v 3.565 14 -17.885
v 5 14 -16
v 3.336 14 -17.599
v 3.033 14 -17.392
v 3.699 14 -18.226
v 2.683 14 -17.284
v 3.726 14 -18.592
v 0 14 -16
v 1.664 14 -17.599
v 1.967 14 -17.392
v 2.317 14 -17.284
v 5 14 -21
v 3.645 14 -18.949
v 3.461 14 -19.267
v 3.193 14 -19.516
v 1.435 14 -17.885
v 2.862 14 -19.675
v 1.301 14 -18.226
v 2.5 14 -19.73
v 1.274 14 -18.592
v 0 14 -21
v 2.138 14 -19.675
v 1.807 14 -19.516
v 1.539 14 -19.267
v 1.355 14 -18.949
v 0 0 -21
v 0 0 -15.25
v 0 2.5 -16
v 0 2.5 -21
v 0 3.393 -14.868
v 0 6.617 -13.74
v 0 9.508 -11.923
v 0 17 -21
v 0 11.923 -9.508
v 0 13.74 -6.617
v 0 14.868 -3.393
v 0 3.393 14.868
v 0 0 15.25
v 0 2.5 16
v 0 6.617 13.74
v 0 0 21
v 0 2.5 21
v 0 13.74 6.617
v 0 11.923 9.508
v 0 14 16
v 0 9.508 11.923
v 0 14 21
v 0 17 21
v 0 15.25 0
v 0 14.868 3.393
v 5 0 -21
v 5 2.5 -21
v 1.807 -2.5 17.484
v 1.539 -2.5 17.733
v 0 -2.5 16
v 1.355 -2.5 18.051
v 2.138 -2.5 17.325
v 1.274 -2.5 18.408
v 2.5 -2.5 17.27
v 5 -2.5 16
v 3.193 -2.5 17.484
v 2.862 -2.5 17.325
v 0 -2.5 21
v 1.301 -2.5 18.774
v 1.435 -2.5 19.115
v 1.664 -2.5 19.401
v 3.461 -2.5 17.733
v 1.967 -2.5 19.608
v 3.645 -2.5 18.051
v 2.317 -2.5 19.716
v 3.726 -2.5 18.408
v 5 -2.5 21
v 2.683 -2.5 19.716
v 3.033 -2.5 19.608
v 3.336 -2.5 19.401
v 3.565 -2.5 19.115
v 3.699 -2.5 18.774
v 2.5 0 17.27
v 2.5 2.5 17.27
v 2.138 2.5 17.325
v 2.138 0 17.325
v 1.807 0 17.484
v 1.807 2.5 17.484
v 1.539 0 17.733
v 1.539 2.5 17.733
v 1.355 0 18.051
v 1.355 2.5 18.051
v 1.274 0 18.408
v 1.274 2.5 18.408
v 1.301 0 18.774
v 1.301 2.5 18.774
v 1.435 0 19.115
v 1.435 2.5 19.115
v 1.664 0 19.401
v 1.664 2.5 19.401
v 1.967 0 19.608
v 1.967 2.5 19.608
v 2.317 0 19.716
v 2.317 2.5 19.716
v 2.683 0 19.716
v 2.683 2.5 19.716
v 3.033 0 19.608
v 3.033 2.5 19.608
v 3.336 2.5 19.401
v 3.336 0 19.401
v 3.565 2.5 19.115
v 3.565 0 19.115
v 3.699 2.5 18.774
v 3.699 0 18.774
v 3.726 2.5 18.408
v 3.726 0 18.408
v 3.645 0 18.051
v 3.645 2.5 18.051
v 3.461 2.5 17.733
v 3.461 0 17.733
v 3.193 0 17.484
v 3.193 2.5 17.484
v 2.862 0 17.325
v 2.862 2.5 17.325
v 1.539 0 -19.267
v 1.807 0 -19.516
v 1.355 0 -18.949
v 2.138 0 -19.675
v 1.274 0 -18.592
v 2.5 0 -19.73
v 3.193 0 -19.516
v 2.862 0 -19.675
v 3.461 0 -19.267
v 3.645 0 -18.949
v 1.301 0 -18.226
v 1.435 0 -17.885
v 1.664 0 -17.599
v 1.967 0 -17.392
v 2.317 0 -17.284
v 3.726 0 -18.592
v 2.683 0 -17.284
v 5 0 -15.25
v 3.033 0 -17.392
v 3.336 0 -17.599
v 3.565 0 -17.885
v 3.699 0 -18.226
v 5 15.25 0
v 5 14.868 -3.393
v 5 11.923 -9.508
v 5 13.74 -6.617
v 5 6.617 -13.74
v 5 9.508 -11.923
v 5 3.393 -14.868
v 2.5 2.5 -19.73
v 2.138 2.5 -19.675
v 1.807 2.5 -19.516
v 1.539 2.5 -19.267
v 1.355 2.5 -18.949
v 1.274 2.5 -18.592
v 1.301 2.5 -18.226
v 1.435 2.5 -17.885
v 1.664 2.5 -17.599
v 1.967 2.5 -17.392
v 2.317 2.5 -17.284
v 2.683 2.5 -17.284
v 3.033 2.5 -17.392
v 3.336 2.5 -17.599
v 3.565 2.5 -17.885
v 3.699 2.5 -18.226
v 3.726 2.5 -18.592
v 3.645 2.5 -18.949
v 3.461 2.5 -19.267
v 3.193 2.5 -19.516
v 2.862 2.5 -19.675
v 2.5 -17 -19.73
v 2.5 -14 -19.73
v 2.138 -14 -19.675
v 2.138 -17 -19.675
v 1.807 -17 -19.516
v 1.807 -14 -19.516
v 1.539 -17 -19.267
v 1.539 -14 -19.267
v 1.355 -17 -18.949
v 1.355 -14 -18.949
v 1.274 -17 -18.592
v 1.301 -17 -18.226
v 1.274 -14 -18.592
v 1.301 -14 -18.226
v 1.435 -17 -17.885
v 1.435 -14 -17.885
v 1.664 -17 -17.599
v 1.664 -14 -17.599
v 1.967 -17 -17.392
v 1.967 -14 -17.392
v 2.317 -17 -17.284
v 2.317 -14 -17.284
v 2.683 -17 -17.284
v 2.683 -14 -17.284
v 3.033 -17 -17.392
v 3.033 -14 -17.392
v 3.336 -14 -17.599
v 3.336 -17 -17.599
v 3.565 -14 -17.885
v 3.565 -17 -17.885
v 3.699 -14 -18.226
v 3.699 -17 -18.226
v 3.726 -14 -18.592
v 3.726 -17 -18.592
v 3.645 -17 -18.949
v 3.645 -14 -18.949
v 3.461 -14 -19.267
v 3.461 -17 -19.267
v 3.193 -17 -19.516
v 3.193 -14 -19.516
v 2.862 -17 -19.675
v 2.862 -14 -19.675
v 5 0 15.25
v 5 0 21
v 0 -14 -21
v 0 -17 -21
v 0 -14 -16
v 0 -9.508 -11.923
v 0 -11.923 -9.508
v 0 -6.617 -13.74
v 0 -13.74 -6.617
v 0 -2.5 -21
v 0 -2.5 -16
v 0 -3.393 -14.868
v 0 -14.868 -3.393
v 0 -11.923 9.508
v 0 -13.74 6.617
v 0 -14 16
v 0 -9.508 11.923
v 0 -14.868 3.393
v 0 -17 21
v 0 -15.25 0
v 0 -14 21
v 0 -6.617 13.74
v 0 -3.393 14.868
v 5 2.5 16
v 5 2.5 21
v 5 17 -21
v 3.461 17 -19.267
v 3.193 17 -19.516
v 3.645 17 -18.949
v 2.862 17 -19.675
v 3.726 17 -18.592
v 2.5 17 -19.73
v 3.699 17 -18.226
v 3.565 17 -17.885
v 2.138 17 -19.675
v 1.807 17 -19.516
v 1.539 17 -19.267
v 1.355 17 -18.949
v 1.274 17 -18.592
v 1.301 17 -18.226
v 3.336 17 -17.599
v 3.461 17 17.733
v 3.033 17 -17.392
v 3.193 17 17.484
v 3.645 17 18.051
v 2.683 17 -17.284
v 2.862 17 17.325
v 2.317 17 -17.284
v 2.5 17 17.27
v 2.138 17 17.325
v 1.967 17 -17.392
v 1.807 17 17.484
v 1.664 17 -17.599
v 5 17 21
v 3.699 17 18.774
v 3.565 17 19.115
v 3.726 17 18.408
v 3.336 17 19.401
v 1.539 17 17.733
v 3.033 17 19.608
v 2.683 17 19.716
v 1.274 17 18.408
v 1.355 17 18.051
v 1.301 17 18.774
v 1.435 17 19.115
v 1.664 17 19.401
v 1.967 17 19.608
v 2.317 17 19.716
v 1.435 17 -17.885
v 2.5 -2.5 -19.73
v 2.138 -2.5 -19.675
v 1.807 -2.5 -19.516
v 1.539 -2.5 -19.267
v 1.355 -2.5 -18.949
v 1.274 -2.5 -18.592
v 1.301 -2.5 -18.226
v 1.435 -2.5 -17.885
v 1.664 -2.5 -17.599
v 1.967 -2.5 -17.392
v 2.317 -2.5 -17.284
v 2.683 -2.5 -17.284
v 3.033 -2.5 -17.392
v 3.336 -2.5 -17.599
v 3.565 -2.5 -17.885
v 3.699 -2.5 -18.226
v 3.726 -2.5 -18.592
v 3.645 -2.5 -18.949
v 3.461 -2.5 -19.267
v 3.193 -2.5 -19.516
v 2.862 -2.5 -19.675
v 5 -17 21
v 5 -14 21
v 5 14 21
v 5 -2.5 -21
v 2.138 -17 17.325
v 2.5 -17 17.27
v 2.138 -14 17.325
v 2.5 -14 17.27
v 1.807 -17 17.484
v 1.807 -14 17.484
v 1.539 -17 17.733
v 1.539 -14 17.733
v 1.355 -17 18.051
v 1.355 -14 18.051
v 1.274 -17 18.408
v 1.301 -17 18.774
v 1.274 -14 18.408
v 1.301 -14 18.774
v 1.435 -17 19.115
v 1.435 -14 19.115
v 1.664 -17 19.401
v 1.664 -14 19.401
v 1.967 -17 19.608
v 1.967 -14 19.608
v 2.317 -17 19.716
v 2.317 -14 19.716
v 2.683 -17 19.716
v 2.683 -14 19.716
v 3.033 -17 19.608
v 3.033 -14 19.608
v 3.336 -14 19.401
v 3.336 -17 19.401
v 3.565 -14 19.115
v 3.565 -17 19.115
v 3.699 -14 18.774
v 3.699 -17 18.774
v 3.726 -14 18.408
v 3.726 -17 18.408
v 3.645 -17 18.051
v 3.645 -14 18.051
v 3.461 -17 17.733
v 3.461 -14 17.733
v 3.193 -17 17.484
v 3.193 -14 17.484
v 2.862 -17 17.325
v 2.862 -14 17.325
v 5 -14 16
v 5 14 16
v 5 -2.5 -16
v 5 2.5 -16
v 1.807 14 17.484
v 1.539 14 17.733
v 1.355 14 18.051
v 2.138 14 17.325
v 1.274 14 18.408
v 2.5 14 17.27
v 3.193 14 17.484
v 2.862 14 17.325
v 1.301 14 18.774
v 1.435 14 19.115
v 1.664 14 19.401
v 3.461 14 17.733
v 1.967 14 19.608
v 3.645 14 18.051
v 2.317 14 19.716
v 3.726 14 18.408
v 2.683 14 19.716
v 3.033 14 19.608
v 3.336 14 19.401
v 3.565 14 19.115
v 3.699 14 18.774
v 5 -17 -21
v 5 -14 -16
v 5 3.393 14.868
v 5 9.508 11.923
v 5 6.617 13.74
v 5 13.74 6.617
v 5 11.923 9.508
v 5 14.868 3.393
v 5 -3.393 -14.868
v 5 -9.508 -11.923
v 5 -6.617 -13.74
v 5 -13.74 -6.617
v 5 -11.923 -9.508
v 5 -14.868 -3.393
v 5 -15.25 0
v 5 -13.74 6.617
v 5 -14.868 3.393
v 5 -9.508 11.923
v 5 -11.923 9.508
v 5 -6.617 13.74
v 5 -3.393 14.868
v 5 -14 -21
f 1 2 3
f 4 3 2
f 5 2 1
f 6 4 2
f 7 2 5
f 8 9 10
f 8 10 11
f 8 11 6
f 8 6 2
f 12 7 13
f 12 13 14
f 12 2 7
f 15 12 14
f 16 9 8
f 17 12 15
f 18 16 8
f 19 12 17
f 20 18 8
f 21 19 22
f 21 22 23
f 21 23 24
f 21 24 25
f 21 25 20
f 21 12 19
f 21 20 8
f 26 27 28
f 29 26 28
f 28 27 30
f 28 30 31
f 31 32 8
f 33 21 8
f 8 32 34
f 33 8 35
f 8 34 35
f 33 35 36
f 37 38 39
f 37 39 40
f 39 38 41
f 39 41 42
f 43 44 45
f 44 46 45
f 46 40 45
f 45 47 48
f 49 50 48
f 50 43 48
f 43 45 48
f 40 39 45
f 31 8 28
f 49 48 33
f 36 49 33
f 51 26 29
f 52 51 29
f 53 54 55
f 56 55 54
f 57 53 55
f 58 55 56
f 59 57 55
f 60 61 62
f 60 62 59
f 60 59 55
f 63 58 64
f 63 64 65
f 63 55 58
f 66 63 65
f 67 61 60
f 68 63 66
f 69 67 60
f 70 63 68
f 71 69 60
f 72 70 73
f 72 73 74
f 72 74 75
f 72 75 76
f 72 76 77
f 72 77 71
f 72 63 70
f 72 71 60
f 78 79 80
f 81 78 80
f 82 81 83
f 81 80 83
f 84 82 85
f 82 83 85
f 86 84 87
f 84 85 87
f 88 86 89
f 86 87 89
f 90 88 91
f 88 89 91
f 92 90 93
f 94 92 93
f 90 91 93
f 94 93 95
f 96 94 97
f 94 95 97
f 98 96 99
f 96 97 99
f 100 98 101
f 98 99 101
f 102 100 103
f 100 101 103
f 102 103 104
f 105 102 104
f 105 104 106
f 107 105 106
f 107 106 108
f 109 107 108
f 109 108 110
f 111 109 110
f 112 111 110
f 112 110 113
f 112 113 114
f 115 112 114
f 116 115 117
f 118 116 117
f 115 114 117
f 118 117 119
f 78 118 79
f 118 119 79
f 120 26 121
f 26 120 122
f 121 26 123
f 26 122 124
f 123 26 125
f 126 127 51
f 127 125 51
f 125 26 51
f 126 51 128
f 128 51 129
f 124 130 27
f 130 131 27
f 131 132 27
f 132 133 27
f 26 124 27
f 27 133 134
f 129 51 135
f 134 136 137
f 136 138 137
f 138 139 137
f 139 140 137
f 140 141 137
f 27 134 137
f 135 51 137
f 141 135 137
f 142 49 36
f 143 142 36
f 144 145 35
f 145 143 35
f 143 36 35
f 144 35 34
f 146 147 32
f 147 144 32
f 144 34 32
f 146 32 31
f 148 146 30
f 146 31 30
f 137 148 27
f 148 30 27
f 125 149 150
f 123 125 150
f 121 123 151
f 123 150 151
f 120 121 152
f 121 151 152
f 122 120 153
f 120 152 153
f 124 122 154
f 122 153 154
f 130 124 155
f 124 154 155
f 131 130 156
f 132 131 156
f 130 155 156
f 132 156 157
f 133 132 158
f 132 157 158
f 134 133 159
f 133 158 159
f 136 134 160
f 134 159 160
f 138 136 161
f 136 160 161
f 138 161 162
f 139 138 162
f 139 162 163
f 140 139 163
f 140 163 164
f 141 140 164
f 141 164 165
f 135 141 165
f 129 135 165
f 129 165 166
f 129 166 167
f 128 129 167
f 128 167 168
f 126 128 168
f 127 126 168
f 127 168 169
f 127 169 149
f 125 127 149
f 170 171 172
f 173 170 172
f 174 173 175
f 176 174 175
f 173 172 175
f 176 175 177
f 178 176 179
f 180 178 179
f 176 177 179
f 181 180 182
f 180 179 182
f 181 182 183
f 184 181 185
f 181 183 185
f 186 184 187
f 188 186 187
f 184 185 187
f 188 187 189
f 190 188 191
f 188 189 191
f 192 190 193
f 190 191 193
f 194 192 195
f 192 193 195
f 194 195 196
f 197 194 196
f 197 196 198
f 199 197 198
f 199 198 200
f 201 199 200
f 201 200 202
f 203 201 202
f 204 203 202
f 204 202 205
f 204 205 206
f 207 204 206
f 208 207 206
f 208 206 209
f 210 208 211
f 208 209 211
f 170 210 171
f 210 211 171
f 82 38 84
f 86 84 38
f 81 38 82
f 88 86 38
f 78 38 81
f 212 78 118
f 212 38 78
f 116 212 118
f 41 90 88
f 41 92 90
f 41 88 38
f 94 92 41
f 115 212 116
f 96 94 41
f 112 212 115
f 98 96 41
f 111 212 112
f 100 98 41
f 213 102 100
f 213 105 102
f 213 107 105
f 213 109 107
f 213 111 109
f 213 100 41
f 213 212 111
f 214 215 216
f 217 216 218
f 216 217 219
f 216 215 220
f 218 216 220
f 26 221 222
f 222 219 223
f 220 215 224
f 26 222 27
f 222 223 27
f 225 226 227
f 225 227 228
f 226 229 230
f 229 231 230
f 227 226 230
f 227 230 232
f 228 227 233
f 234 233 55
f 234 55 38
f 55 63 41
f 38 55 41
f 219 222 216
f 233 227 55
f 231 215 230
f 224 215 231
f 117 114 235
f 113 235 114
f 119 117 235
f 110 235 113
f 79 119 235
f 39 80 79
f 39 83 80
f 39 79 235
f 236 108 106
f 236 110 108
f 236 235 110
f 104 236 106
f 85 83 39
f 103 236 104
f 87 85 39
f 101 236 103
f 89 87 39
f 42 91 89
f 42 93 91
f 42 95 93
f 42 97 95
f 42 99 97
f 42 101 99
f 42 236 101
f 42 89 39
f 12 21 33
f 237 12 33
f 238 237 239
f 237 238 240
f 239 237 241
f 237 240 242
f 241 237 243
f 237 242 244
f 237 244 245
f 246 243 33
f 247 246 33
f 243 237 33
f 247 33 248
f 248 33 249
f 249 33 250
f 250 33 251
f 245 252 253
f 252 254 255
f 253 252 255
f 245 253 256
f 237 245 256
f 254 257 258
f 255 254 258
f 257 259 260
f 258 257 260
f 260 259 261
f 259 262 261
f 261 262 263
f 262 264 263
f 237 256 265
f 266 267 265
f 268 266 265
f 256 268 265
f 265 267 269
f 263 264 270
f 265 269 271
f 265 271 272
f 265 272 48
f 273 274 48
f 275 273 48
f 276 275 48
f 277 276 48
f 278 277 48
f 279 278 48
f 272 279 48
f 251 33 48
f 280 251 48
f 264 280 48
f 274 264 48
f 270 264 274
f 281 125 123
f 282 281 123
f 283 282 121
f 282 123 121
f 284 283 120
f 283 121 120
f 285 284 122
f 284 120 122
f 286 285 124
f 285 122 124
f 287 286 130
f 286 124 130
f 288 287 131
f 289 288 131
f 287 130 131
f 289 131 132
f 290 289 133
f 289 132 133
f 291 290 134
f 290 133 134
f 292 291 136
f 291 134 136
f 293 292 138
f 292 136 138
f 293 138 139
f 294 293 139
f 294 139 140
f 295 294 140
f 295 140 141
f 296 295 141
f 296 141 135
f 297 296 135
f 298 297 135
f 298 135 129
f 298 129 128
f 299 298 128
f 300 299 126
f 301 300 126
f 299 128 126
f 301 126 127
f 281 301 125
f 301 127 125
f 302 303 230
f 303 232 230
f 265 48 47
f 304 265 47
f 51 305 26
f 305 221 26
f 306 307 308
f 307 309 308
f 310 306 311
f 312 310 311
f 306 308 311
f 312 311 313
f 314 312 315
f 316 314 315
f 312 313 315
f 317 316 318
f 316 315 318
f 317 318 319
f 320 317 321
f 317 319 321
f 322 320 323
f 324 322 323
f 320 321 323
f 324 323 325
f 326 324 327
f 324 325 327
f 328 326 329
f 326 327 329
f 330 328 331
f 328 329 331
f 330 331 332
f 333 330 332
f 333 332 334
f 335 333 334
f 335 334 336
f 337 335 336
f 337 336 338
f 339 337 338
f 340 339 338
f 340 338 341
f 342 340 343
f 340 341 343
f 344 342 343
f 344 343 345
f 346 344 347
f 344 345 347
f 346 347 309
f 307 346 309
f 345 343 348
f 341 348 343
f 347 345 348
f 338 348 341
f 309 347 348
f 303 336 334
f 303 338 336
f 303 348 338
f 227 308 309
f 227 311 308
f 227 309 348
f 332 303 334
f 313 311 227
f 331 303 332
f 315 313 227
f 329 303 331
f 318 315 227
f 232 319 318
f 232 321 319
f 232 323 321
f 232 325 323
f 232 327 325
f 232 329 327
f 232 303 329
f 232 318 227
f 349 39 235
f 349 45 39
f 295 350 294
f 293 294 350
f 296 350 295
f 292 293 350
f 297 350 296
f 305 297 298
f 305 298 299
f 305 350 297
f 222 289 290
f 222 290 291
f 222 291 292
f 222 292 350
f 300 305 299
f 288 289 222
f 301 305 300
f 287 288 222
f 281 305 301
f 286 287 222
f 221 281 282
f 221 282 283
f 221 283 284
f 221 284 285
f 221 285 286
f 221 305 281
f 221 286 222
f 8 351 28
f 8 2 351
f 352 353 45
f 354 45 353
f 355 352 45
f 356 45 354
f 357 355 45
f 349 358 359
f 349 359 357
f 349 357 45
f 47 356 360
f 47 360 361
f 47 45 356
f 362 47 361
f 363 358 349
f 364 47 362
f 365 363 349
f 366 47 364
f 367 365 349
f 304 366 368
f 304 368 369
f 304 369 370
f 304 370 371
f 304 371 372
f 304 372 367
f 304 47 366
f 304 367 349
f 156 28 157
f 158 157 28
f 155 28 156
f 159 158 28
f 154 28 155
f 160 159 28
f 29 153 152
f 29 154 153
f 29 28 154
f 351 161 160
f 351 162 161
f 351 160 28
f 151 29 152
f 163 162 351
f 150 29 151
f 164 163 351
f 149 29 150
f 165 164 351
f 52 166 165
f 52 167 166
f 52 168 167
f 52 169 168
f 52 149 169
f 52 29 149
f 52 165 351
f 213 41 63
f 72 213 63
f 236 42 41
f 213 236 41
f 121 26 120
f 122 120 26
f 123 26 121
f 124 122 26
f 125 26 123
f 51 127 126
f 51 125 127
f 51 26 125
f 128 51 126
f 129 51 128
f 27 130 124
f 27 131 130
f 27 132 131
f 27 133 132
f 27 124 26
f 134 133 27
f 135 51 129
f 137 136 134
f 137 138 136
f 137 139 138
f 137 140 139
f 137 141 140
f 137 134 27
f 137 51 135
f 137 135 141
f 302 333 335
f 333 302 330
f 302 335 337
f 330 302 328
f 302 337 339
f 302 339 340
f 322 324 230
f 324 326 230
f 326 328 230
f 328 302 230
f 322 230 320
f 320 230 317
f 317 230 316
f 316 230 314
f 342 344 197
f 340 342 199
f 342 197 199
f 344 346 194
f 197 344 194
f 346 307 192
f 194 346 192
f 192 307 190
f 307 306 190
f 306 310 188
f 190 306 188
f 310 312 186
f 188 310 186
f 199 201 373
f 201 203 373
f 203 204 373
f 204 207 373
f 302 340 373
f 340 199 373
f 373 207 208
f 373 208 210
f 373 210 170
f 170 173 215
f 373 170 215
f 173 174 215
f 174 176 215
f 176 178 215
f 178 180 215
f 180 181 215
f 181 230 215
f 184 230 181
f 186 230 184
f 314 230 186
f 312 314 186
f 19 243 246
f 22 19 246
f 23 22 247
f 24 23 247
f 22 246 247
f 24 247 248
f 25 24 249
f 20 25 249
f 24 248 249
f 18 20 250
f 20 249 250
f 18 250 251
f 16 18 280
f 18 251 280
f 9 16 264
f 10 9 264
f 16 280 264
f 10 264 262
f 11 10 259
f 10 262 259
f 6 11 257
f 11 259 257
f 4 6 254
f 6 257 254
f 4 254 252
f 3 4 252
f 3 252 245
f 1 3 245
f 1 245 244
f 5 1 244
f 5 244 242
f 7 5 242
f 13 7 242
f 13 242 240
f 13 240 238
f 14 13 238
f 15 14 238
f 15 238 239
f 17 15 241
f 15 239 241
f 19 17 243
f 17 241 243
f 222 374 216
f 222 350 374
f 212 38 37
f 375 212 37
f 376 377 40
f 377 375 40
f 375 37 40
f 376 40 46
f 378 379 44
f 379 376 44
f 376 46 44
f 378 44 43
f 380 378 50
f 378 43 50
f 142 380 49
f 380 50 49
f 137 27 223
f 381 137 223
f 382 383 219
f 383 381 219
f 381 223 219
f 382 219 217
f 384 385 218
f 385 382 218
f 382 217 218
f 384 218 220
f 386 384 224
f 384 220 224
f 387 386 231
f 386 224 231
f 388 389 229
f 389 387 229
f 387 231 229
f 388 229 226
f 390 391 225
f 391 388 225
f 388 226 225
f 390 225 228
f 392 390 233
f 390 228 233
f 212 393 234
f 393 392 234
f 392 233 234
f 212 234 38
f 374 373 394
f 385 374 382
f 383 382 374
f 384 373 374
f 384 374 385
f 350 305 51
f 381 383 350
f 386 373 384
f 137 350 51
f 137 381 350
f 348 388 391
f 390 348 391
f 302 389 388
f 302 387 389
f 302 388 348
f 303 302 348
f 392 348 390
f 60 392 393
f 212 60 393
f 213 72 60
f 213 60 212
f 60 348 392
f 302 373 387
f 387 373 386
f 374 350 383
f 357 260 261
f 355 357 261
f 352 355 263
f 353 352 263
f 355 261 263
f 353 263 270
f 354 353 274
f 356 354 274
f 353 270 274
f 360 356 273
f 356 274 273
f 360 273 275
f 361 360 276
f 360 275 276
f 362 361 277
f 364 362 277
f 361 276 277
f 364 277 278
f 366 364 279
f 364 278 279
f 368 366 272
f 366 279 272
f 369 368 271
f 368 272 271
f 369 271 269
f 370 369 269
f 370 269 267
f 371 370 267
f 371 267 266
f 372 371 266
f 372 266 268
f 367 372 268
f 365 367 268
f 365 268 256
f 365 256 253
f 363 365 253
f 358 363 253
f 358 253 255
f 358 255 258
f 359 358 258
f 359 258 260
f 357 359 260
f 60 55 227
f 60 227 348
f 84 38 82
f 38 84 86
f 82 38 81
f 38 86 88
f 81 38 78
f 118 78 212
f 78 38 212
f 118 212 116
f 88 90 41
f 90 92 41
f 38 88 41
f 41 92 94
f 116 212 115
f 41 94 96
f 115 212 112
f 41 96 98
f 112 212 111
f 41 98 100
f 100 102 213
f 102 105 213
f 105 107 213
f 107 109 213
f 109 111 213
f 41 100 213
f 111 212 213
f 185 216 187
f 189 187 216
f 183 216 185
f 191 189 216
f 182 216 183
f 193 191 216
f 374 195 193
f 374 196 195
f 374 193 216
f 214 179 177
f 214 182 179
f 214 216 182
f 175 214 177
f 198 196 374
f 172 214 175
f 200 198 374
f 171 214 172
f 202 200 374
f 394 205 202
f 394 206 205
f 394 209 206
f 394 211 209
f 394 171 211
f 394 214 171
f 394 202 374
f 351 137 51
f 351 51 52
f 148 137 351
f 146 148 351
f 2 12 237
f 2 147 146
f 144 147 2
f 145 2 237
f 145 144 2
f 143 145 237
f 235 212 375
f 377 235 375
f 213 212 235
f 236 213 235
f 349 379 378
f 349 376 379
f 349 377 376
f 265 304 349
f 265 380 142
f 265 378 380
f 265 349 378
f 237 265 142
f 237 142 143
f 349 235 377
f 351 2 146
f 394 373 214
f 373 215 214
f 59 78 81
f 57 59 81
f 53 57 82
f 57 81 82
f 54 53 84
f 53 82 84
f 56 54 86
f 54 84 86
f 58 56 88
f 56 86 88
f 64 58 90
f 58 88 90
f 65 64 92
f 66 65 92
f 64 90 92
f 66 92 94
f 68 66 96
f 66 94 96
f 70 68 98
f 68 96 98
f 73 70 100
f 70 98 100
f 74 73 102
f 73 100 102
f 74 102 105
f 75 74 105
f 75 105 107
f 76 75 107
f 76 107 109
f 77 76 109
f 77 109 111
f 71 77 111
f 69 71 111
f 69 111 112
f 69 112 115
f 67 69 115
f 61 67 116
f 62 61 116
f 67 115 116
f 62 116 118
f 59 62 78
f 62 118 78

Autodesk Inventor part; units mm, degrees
ref_plane "YZ Plane" through (0, 0, 0) normal (1, 0, 0) x (0, 1, 0)
ref_plane "XZ Plane" through (0, 0, 0) normal (0, 1, 0) x (-1, 0, 0)
ref_plane "XY Plane" through (0, 0, 0) normal (0, 0, 1) x (1, 0, 0)
sketch "Sketch1" plane through (0, 0, 0) normal (1, 0, 0) x (0, 1, 0)
  circle A0 centre (0, 0) radius 15.25
  line L0 (15.25, 15.25) -> (-15.25, 15.25)
  line L1 (-15.25, 15.25) -> (-15.25, -15.25) construction
  line L2 (-15.25, -15.25) -> (15.25, -15.25)
  line L3 (15.25, -15.25) -> (15.25, 15.25) construction
  line L4 (15.25, 15.25) -> (-15.25, -15.25) construction
  line L5 (-15.25, 15.25) -> (15.25, -15.25) construction
  line L6 (17, 21) -> (-17, 21)
  line L7 (-17, 21) -> (-17, -21)
  line L8 (-17, -21) -> (17, -21)
  line L9 (17, -21) -> (17, 21)
  line L10 (17, 21) -> (-17, -21) construction
  line L11 (-17, 21) -> (17, -21) construction
  circle A1 centre (13.25, -13.25) radius 1
  circle A2 centre (13.25, 12.75) radius 1
  circle A3 centre (-12.75, -13.25) radius 1
  circle A4 centre (-12.75, 12.75) radius 1
  line L12 (17, -15.25) -> (15.25, -15.25)
  line L13 (-15.25, -15.25) -> (-17, -15.25)
  line L14 (17, 15.25) -> (15.25, 15.25)
  line L15 (-15.25, 15.25) -> (-17, 15.25)
  point P0 (0, -15.25)
  point P1 (0, 15.25)
  dimension "d0" = 30.5
  dimension "d1" = 42
  dimension "d2" = 34
  dimension "d10" = 2
  dimension "d11" = 2
  dimension "d14" = 26
  dimension "d17" = 26
sketch "Sketch2" plane through (0, 0, 0) normal (0, 1, 0) x (-1, 0, 0)
  line L0 (190, 50) -> (-10, 50)
  line L1 (-10, 50) -> (-10, -50)
  line L2 (-10, -50) -> (190, -50)
  line L3 (190, -50) -> (190, 50)
  point P0 (0, 0)
  point P1 (-10, 0)
  dimension "d3" = 200
  dimension "d4" = 100
  dimension "d5" = 10
extrude "Extrusion1" add sketch "Sketch1" along normal blind 5 contours A0 | A0 L0 L14 L9 L12 L2 | L0 L15 L7 L6 L9 L14 | A0 L2 L13 L7 L15 L0 | L2 L12 L9 L8 L7 L13 | A1 | A2 | A3 | A4
extrude "Extrusion4" [suppressed]
extrude "Extrusion3" cut sketch "Sketch1" along normal blind 5 contours A0
sketch "Sketch3" plane through (0, -17, 21) normal (0, 0, 1) x (1, 0, 0)
  line L0 (0, 0) -> (5, 0) projected
  line L1 (5, 34) -> (5, 0) projected
  line L2 (0.0059, 34.0012) -> (0.0059, 34.0101)
  line L3 (5, 0) -> (5, 34) projected
  line L4 (0, 14.5) -> (5, 14.5)
  line L5 (5, 14.5) -> (5, 3)
  line L6 (5, 3) -> (0, 3)
  line L7 (0, 3) -> (0, 14.5)
  line L8 (0, 31) -> (5, 31)
  line L9 (5, 31) -> (5, 19.5)
  line L10 (5, 19.5) -> (0, 19.5)
  line L11 (0, 19.5) -> (0, 31)
  line L12 (0, 34) -> (5, 34) projected
  line L13 (0, 34) -> (0, 0) projected
  point P0 (0, 17)
  point P1 (5, 3)
  point P2 (0.0059, 34)
  point P3 (0, 17)
  dimension "d26" = 3
  dimension "d27" = 5
  dimension "d43" = 3
  dimension "d44" = 2.5
extrude "Extrusion5" cut sketch "Sketch3" against normal blind 5 contours L7 L4 L1 L6 | L11 L8 L1 L10
mirror "Mirror1" about plane through (0, 0, 0) normal (0, 0, 1) of "Extrusion5"
sketch "Sketch4" plane through (0, -17, -21) normal (0, -1, 0) x (1, 0, 0)
  line L0 (5, 42) -> (5, 0) projected
  line L1 (0, 0) -> (5, 0) projected
  line L2 (0, 42) -> (5, 42) projected
  point P0 (0, 21)
  point P1 (2.5, 39.5)
  point P2 (2.5, 2.5)
  dimension "d39" = 2.5
  dimension "d40" = 2.5
  dimension "d41" = 2.5
  dimension "d42" = 2.5
hole "Hole1" at (2.5, -17, 18.5) at (2.5, -17, -18.5) direction (0, 1, 0) diameter 2.459 end through all thread size "M3x0.5" class "6H" standard "ISO Metric profile"
split body "Split1" result two bodies by plane through (0, 0, 0) normal (0, 1, 0) first body at (0.5, 16.4167, 0)
properties part number "Laser holder2"
